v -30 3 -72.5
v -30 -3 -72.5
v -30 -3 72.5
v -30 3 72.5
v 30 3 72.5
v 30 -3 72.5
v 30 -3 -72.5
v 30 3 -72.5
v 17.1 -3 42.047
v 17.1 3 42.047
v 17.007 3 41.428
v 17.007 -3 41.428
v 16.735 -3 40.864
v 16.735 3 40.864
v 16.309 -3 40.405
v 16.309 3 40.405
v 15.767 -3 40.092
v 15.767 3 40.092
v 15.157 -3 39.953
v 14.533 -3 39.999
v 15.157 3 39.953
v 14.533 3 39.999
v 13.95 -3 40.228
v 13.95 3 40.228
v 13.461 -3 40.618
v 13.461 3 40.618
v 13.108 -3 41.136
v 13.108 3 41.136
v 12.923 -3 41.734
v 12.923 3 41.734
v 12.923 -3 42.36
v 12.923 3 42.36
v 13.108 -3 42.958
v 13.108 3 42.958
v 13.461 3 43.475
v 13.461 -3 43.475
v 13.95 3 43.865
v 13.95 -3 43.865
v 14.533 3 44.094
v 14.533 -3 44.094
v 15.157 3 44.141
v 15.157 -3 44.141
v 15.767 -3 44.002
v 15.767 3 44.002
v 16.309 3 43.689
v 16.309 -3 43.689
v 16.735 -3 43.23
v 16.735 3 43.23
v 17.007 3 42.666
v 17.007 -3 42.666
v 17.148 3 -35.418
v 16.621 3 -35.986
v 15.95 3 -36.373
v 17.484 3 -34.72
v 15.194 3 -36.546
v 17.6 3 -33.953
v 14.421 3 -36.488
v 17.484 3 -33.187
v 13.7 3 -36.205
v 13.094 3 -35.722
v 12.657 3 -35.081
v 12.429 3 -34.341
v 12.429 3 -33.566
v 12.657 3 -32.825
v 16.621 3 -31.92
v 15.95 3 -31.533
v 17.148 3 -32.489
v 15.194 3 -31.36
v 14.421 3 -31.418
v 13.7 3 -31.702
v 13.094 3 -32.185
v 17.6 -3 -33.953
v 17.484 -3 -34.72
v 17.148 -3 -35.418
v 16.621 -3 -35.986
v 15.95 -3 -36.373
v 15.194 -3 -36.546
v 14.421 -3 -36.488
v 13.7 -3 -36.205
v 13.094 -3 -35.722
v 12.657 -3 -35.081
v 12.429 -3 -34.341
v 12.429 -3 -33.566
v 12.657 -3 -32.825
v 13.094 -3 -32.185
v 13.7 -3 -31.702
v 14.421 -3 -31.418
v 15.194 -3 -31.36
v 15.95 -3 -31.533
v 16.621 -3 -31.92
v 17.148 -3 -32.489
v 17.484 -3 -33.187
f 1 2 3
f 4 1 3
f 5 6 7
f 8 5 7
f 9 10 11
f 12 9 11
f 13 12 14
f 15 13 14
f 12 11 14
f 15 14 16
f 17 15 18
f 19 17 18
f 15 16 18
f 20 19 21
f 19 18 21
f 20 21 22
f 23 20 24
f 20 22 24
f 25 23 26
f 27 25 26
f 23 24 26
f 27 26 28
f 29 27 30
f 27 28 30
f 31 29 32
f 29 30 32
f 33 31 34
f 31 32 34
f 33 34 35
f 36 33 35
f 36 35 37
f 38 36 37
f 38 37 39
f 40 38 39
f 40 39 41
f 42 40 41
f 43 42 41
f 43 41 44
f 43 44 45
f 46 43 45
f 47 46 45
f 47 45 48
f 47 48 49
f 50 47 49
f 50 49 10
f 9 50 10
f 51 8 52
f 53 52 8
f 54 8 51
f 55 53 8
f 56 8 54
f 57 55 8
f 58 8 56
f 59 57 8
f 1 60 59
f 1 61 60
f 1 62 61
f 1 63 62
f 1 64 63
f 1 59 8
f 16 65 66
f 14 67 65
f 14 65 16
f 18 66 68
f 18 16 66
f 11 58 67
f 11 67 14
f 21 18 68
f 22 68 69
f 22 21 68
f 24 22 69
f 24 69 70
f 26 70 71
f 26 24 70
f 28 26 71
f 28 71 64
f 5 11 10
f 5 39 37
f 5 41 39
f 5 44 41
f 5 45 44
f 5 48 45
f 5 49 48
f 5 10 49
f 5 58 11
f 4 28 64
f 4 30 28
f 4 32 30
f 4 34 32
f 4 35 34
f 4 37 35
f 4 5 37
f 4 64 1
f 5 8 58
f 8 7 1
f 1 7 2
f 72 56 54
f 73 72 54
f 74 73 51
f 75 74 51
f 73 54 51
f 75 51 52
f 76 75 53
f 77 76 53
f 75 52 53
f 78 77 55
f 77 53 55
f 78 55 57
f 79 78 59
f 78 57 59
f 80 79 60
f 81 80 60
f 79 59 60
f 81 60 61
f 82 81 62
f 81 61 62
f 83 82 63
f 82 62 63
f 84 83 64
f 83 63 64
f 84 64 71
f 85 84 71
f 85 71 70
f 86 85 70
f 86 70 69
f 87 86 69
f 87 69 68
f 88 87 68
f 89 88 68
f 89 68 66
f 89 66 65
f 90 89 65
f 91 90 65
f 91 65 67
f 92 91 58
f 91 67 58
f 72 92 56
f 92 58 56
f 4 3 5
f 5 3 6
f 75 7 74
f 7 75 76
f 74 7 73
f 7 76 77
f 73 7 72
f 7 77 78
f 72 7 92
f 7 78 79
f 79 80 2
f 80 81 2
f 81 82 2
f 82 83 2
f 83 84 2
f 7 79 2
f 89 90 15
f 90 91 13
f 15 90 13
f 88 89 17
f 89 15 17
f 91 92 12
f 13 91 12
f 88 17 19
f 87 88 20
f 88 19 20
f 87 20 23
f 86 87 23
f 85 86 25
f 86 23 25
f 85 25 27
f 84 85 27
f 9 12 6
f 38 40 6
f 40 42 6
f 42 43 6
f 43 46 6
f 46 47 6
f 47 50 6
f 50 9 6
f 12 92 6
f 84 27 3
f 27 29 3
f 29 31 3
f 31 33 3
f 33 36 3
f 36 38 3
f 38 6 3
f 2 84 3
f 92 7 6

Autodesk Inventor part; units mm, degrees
ref_plane "YZ Plane" through (0, 0, 0) normal (1, 0, 0) x (0, 1, 0)
ref_plane "XZ Plane" through (0, 0, 0) normal (0, 1, 0) x (-1, 0, 0)
ref_plane "XY Plane" through (0, 0, 0) normal (0, 0, 1) x (1, 0, 0)
sketch "Эскиз1" plane through (0, 0, 0) normal (0, 1, 0) x (-1, 0, 0)
  line L0 (-30, -72.5) -> (30, -72.5)
  line L1 (30, -72.5) -> (30, 72.5)
  line L2 (30, 72.5) -> (-30, 72.5)
  line L3 (-30, 72.5) -> (-30, -72.5)
  line L4 (-30, -72.5) -> (30, 72.5) construction
  line L5 (30, -72.5) -> (-30, 72.5) construction
  point P0 (0, 0)
  dimension "d0" = 145
  dimension "d1" = 60
extrude "Выдавливание1" add sketch "Эскиз1" along normal mid plane 6
sketch "Эскиз2" plane through (0, 3, 0) normal (0, 1, 0) x (1, 0, 0)
  circle A0 centre (15, -42.0468) radius 2.1 projected
  circle A1 centre (15, 33.9532) radius 2.6 projected
  point P0 (0, 0)
extrude "Выдавливание2" cut sketch "Эскиз2" against normal up to next
properties part number "проставка"
